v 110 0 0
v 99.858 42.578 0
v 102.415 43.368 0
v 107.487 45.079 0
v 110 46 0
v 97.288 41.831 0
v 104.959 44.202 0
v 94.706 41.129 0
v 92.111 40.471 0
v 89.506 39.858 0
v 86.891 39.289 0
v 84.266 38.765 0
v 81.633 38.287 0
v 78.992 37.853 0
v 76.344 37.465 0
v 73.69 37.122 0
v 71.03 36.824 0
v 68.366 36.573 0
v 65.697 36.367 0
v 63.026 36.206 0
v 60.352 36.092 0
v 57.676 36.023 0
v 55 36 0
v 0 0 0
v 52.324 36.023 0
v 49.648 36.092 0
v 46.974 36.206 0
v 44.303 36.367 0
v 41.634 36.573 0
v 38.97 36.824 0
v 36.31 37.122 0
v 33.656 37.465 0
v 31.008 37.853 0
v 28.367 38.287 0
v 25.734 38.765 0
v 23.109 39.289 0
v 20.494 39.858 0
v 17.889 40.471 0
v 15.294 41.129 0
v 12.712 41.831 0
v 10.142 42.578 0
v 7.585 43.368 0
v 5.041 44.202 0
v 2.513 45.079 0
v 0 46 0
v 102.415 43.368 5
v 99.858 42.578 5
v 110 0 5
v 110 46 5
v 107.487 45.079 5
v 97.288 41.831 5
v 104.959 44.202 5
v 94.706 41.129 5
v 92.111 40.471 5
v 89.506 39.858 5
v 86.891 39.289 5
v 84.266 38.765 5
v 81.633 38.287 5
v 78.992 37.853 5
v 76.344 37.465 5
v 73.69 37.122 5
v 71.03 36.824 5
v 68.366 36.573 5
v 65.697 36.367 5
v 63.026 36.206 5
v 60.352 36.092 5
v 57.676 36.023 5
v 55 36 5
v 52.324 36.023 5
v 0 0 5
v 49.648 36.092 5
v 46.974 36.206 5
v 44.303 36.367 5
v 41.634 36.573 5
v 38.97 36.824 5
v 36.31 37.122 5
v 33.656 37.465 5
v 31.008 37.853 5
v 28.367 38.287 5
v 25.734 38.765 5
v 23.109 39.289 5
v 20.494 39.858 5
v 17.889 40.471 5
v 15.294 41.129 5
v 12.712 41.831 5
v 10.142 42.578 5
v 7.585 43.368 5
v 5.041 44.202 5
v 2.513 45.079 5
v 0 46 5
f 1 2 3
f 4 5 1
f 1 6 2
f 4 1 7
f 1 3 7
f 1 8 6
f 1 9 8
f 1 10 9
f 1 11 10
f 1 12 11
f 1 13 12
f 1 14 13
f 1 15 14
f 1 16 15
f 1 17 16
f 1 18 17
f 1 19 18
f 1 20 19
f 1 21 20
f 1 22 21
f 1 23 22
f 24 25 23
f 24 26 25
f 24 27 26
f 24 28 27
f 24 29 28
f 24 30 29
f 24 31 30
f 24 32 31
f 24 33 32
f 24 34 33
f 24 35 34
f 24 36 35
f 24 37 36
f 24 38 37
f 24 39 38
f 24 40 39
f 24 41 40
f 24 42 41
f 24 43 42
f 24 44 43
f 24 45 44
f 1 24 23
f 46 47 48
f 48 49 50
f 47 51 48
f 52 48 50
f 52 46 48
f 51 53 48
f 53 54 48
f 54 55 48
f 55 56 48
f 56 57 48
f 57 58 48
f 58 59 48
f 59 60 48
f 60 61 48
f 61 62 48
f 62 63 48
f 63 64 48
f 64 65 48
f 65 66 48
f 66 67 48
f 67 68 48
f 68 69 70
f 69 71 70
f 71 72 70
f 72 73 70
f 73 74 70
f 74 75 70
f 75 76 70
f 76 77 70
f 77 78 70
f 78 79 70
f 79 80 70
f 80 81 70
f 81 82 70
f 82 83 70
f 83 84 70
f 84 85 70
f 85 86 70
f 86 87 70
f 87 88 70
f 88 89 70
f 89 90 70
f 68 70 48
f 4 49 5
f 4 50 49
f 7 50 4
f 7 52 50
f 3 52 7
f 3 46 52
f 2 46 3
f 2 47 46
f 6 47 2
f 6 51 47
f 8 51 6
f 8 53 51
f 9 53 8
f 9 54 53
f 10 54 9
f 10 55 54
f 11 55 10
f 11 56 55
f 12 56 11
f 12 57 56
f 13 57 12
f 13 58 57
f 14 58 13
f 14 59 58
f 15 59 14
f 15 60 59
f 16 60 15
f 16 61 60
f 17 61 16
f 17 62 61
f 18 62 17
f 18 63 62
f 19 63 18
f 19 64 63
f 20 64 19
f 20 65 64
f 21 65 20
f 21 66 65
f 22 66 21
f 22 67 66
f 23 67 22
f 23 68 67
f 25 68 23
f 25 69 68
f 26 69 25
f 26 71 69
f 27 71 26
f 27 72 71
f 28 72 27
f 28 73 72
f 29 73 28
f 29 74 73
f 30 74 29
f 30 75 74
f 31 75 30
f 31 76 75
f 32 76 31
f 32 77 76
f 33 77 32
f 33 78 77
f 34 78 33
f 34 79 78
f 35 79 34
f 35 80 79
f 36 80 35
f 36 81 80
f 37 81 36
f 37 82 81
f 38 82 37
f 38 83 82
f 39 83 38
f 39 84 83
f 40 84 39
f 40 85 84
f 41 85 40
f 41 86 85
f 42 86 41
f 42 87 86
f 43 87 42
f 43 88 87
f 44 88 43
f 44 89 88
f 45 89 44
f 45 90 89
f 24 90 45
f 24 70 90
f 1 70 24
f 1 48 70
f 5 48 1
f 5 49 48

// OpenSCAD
$fn = 32;

// ----------------------------------------------------------------------
// Arc profile plate: notch, 45 points
// ----------------------------------------------------------------------

// --- parameters (mm) ---
bar_l = 110;              // bar length, X
bar_w = 46;               // bar width, Y
notch_depth = 10;         // depth of the arc notch at mid-span
arc_r = 156.25;           // radius of the notch arc
arc_angle = 41.22;        // notch arc angle, degrees
arc_step = 1;             // sampling step of the notch arc, degrees
plate_t = 5;              // plate thickness, Z
fit_tol = 0.05;           // declared fit tolerance (prompt contract)
free_tol = 0.3;           // declared free tolerance (prompt contract)

profile = [[0, 0], [110, 0], [110, 46], [107.487, 45.079], [104.959, 44.202], [102.415, 43.368], [99.858, 42.578], [97.288, 41.831], [94.706, 41.129], [92.111, 40.471], [89.506, 39.858], [86.891, 39.289], [84.266, 38.765], [81.633, 38.287], [78.992, 37.853], [76.344, 37.465], [73.69, 37.122], [71.03, 36.824], [68.366, 36.573], [65.697, 36.367], [63.026, 36.206], [60.352, 36.092], [57.676, 36.023], [55, 36], [52.324, 36.023], [49.648, 36.092], [46.974, 36.206], [44.303, 36.367], [41.634, 36.573], [38.97, 36.824], [36.31, 37.122], [33.656, 37.465], [31.008, 37.853], [28.367, 38.287], [25.734, 38.765], [23.109, 39.289], [20.494, 39.858], [17.889, 40.471], [15.294, 41.129], [12.712, 41.831], [10.142, 42.578], [7.585, 43.368], [5.041, 44.202], [2.513, 45.079], [0, 46]];  // primary outline, 45 points, counter clockwise

// --- the one profile operation ---
linear_extrude(height = plate_t) polygon(points = profile);
